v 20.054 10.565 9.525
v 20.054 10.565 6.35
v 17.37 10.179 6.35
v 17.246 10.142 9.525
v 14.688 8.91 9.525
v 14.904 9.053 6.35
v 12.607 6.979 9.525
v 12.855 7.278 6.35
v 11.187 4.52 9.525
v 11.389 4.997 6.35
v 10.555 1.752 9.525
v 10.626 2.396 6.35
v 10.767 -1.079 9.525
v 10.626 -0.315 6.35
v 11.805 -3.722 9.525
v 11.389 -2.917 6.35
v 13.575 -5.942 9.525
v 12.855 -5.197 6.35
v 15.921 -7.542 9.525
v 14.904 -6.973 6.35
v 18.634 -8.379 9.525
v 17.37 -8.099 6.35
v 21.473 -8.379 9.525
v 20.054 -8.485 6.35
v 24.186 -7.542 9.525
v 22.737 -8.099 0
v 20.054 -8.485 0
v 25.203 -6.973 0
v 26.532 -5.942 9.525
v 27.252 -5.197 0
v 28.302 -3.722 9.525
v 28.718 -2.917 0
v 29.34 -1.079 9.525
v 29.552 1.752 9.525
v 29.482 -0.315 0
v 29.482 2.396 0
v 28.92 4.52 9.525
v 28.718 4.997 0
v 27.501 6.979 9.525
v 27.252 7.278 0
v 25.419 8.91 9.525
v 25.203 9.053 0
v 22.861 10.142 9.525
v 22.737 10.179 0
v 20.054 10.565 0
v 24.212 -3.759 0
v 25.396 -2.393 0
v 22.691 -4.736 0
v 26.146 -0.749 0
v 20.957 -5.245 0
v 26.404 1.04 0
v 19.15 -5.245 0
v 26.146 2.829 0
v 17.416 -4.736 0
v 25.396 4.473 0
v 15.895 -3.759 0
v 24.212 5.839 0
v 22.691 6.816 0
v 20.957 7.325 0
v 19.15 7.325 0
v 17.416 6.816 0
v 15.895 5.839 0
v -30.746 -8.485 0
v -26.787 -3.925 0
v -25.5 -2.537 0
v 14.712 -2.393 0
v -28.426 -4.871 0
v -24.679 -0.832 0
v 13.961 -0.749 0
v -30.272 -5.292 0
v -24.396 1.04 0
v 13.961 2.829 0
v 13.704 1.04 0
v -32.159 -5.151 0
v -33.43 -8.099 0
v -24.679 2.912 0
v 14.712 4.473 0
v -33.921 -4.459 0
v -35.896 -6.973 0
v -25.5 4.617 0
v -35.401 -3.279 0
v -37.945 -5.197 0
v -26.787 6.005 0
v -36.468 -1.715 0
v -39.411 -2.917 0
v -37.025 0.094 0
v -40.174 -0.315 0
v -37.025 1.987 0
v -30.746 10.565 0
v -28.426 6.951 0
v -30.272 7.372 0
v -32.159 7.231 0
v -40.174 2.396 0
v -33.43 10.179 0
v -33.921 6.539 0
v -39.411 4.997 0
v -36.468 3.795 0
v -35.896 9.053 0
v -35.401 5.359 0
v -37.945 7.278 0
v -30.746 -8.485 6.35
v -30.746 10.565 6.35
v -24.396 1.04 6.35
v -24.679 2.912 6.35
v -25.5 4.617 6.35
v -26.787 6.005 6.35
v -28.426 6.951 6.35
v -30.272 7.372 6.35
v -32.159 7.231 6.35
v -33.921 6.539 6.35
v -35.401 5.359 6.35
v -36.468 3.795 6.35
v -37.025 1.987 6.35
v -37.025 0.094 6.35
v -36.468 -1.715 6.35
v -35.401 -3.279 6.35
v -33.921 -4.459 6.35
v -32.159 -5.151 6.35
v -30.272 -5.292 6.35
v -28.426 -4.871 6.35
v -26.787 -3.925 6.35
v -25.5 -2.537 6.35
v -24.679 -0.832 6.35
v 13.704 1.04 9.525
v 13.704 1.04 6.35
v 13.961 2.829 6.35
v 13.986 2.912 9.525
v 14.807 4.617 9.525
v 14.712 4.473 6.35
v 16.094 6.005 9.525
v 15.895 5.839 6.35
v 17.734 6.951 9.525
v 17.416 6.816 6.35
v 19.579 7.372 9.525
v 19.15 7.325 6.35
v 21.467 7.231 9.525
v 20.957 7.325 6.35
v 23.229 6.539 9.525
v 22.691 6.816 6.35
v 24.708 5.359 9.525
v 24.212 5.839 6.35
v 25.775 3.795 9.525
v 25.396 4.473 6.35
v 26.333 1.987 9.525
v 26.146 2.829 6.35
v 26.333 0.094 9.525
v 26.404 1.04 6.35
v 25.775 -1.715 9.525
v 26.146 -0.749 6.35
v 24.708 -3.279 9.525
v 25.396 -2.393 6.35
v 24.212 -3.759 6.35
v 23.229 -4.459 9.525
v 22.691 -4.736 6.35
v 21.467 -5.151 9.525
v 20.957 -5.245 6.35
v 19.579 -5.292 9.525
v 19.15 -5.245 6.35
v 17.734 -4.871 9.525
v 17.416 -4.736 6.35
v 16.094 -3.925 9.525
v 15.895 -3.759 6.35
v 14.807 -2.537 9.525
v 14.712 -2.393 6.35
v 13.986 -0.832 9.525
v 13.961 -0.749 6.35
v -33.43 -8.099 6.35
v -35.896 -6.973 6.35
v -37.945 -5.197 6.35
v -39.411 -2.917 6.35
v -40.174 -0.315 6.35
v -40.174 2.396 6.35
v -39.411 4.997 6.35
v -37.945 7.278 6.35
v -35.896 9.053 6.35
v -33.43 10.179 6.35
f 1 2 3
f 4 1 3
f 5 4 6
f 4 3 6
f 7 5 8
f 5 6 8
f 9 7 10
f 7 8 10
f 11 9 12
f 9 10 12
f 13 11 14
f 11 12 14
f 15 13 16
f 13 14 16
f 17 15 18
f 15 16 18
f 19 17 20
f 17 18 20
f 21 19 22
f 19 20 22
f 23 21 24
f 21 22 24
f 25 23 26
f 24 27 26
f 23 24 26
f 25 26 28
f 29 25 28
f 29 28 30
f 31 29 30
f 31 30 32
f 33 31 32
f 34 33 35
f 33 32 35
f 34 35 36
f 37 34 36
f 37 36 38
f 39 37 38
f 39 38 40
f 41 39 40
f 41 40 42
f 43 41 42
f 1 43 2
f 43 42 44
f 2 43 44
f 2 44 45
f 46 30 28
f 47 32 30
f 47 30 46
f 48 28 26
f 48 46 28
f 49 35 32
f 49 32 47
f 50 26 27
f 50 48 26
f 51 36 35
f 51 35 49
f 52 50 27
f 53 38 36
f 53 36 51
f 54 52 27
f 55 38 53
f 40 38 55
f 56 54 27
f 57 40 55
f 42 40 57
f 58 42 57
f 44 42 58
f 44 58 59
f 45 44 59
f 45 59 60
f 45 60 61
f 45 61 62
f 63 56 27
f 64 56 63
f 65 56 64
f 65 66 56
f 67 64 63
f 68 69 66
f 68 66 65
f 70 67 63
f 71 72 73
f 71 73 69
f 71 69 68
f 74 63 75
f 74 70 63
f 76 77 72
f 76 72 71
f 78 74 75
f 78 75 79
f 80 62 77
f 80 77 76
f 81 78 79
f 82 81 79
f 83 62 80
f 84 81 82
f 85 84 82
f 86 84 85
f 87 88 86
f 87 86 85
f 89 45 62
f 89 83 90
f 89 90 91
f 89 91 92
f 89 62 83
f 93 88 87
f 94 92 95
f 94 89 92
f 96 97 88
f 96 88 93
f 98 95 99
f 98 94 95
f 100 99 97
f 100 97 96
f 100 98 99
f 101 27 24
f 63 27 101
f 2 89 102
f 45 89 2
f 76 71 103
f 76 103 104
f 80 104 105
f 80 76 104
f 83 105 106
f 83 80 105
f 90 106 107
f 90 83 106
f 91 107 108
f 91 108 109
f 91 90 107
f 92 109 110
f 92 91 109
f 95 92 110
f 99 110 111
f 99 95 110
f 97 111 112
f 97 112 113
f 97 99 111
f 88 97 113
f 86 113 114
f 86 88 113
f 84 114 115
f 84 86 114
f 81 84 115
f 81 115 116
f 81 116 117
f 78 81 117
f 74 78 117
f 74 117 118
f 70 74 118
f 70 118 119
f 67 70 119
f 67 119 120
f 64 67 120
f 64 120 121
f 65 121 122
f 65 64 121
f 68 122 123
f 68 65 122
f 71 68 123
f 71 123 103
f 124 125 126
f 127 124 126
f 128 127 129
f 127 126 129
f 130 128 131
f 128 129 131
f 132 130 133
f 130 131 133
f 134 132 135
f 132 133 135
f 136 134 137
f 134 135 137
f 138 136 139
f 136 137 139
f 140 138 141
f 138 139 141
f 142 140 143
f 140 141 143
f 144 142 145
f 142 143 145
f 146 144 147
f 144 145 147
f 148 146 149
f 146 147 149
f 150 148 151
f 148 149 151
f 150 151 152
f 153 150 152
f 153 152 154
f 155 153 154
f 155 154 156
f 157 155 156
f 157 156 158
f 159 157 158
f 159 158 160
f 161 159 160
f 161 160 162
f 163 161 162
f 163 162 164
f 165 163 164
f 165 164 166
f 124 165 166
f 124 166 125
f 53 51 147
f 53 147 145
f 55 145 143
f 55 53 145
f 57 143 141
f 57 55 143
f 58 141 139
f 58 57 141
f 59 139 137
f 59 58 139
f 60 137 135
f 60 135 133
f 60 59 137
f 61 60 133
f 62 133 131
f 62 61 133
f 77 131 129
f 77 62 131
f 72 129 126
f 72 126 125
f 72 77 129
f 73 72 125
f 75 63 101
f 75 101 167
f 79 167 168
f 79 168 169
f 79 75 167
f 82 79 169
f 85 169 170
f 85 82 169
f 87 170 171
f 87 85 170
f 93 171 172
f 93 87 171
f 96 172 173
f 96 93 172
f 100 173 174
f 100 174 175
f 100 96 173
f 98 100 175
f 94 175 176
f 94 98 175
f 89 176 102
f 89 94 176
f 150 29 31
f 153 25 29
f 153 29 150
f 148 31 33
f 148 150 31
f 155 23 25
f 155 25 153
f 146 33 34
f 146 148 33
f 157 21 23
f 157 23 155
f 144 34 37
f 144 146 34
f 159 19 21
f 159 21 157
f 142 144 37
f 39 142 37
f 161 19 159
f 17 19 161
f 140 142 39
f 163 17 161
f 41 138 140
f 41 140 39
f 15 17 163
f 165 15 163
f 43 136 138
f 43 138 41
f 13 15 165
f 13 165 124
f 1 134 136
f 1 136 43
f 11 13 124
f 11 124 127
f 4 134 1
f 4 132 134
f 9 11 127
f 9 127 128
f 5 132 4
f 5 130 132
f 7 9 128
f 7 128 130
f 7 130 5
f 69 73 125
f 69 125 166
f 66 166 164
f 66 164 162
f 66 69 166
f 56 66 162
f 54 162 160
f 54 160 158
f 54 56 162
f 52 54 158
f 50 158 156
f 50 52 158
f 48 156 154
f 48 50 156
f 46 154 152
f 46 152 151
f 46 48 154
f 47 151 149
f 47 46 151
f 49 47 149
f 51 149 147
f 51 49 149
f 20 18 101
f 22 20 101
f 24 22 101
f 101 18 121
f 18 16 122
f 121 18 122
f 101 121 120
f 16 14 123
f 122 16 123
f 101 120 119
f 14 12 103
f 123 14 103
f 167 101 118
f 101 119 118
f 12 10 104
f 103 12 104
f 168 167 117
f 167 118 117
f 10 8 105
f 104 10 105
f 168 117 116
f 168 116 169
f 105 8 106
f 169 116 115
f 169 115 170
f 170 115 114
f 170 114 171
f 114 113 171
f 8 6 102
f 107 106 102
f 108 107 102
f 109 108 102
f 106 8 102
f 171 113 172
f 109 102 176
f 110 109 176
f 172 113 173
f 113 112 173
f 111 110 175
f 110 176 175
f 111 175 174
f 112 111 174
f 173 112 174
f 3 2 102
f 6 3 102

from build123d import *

# Parameters (mm, degrees)
SKETCH1_R           = 6.35
BOSS_EXTRUDE1_DEPTH = 6.35
SKETCH2_R           = 9.525
BOSS_EXTRUDE2_DEPTH = 3.175
SKETCH3_R           = 6.35
CUT_EXTRUDE1_DEPTH  = 43.709869791


with BuildPart() as part:
    # Sketch1 → Boss-Extrude1 (new body)
    with BuildSketch(Plane.XY):
        with BuildLine():
            Line((-30.746408046, 10.565086207), (20.053591954, 10.565086207))
            ThreePointArc((20.053591954, 10.565086207), (29.578591954, 1.040086207), (20.053591954, -8.484913793))
            Line((20.053591954, -8.484913793), (-30.746408046, -8.484913793))
            ThreePointArc((-30.746408046, -8.484913793), (-40.271408046, 1.040086207), (-30.746408046, 10.565086207))
        make_face()
        with Locations((-30.746408046, 1.040086207)):
            Circle(SKETCH1_R, mode=Mode.SUBTRACT)
        with Locations((20.053591954, 1.040086207)):
            Circle(SKETCH1_R, mode=Mode.SUBTRACT)
    extrude(amount=BOSS_EXTRUDE1_DEPTH)

    # Sketch2 → Boss-Extrude2 (add)
    with BuildSketch(Plane.XY.offset(6.35)):
        with Locations(Location((20.053591954, 1.040086207, 0), (0, 0, 90))):
            Circle(SKETCH2_R)
    extrude(amount=BOSS_EXTRUDE2_DEPTH)

    # Sketch3 → Cut-Extrude1 (cut, through all)
    with BuildSketch(Plane(origin=(0, 0, 0), x_dir=(-1, 0, 0), z_dir=(0, 0, -1))):
        with Locations((-20.053591954, 1.040086207)):
            Circle(SKETCH3_R)
    extrude(amount=-CUT_EXTRUDE1_DEPTH, mode=Mode.SUBTRACT)


solid = part.part
